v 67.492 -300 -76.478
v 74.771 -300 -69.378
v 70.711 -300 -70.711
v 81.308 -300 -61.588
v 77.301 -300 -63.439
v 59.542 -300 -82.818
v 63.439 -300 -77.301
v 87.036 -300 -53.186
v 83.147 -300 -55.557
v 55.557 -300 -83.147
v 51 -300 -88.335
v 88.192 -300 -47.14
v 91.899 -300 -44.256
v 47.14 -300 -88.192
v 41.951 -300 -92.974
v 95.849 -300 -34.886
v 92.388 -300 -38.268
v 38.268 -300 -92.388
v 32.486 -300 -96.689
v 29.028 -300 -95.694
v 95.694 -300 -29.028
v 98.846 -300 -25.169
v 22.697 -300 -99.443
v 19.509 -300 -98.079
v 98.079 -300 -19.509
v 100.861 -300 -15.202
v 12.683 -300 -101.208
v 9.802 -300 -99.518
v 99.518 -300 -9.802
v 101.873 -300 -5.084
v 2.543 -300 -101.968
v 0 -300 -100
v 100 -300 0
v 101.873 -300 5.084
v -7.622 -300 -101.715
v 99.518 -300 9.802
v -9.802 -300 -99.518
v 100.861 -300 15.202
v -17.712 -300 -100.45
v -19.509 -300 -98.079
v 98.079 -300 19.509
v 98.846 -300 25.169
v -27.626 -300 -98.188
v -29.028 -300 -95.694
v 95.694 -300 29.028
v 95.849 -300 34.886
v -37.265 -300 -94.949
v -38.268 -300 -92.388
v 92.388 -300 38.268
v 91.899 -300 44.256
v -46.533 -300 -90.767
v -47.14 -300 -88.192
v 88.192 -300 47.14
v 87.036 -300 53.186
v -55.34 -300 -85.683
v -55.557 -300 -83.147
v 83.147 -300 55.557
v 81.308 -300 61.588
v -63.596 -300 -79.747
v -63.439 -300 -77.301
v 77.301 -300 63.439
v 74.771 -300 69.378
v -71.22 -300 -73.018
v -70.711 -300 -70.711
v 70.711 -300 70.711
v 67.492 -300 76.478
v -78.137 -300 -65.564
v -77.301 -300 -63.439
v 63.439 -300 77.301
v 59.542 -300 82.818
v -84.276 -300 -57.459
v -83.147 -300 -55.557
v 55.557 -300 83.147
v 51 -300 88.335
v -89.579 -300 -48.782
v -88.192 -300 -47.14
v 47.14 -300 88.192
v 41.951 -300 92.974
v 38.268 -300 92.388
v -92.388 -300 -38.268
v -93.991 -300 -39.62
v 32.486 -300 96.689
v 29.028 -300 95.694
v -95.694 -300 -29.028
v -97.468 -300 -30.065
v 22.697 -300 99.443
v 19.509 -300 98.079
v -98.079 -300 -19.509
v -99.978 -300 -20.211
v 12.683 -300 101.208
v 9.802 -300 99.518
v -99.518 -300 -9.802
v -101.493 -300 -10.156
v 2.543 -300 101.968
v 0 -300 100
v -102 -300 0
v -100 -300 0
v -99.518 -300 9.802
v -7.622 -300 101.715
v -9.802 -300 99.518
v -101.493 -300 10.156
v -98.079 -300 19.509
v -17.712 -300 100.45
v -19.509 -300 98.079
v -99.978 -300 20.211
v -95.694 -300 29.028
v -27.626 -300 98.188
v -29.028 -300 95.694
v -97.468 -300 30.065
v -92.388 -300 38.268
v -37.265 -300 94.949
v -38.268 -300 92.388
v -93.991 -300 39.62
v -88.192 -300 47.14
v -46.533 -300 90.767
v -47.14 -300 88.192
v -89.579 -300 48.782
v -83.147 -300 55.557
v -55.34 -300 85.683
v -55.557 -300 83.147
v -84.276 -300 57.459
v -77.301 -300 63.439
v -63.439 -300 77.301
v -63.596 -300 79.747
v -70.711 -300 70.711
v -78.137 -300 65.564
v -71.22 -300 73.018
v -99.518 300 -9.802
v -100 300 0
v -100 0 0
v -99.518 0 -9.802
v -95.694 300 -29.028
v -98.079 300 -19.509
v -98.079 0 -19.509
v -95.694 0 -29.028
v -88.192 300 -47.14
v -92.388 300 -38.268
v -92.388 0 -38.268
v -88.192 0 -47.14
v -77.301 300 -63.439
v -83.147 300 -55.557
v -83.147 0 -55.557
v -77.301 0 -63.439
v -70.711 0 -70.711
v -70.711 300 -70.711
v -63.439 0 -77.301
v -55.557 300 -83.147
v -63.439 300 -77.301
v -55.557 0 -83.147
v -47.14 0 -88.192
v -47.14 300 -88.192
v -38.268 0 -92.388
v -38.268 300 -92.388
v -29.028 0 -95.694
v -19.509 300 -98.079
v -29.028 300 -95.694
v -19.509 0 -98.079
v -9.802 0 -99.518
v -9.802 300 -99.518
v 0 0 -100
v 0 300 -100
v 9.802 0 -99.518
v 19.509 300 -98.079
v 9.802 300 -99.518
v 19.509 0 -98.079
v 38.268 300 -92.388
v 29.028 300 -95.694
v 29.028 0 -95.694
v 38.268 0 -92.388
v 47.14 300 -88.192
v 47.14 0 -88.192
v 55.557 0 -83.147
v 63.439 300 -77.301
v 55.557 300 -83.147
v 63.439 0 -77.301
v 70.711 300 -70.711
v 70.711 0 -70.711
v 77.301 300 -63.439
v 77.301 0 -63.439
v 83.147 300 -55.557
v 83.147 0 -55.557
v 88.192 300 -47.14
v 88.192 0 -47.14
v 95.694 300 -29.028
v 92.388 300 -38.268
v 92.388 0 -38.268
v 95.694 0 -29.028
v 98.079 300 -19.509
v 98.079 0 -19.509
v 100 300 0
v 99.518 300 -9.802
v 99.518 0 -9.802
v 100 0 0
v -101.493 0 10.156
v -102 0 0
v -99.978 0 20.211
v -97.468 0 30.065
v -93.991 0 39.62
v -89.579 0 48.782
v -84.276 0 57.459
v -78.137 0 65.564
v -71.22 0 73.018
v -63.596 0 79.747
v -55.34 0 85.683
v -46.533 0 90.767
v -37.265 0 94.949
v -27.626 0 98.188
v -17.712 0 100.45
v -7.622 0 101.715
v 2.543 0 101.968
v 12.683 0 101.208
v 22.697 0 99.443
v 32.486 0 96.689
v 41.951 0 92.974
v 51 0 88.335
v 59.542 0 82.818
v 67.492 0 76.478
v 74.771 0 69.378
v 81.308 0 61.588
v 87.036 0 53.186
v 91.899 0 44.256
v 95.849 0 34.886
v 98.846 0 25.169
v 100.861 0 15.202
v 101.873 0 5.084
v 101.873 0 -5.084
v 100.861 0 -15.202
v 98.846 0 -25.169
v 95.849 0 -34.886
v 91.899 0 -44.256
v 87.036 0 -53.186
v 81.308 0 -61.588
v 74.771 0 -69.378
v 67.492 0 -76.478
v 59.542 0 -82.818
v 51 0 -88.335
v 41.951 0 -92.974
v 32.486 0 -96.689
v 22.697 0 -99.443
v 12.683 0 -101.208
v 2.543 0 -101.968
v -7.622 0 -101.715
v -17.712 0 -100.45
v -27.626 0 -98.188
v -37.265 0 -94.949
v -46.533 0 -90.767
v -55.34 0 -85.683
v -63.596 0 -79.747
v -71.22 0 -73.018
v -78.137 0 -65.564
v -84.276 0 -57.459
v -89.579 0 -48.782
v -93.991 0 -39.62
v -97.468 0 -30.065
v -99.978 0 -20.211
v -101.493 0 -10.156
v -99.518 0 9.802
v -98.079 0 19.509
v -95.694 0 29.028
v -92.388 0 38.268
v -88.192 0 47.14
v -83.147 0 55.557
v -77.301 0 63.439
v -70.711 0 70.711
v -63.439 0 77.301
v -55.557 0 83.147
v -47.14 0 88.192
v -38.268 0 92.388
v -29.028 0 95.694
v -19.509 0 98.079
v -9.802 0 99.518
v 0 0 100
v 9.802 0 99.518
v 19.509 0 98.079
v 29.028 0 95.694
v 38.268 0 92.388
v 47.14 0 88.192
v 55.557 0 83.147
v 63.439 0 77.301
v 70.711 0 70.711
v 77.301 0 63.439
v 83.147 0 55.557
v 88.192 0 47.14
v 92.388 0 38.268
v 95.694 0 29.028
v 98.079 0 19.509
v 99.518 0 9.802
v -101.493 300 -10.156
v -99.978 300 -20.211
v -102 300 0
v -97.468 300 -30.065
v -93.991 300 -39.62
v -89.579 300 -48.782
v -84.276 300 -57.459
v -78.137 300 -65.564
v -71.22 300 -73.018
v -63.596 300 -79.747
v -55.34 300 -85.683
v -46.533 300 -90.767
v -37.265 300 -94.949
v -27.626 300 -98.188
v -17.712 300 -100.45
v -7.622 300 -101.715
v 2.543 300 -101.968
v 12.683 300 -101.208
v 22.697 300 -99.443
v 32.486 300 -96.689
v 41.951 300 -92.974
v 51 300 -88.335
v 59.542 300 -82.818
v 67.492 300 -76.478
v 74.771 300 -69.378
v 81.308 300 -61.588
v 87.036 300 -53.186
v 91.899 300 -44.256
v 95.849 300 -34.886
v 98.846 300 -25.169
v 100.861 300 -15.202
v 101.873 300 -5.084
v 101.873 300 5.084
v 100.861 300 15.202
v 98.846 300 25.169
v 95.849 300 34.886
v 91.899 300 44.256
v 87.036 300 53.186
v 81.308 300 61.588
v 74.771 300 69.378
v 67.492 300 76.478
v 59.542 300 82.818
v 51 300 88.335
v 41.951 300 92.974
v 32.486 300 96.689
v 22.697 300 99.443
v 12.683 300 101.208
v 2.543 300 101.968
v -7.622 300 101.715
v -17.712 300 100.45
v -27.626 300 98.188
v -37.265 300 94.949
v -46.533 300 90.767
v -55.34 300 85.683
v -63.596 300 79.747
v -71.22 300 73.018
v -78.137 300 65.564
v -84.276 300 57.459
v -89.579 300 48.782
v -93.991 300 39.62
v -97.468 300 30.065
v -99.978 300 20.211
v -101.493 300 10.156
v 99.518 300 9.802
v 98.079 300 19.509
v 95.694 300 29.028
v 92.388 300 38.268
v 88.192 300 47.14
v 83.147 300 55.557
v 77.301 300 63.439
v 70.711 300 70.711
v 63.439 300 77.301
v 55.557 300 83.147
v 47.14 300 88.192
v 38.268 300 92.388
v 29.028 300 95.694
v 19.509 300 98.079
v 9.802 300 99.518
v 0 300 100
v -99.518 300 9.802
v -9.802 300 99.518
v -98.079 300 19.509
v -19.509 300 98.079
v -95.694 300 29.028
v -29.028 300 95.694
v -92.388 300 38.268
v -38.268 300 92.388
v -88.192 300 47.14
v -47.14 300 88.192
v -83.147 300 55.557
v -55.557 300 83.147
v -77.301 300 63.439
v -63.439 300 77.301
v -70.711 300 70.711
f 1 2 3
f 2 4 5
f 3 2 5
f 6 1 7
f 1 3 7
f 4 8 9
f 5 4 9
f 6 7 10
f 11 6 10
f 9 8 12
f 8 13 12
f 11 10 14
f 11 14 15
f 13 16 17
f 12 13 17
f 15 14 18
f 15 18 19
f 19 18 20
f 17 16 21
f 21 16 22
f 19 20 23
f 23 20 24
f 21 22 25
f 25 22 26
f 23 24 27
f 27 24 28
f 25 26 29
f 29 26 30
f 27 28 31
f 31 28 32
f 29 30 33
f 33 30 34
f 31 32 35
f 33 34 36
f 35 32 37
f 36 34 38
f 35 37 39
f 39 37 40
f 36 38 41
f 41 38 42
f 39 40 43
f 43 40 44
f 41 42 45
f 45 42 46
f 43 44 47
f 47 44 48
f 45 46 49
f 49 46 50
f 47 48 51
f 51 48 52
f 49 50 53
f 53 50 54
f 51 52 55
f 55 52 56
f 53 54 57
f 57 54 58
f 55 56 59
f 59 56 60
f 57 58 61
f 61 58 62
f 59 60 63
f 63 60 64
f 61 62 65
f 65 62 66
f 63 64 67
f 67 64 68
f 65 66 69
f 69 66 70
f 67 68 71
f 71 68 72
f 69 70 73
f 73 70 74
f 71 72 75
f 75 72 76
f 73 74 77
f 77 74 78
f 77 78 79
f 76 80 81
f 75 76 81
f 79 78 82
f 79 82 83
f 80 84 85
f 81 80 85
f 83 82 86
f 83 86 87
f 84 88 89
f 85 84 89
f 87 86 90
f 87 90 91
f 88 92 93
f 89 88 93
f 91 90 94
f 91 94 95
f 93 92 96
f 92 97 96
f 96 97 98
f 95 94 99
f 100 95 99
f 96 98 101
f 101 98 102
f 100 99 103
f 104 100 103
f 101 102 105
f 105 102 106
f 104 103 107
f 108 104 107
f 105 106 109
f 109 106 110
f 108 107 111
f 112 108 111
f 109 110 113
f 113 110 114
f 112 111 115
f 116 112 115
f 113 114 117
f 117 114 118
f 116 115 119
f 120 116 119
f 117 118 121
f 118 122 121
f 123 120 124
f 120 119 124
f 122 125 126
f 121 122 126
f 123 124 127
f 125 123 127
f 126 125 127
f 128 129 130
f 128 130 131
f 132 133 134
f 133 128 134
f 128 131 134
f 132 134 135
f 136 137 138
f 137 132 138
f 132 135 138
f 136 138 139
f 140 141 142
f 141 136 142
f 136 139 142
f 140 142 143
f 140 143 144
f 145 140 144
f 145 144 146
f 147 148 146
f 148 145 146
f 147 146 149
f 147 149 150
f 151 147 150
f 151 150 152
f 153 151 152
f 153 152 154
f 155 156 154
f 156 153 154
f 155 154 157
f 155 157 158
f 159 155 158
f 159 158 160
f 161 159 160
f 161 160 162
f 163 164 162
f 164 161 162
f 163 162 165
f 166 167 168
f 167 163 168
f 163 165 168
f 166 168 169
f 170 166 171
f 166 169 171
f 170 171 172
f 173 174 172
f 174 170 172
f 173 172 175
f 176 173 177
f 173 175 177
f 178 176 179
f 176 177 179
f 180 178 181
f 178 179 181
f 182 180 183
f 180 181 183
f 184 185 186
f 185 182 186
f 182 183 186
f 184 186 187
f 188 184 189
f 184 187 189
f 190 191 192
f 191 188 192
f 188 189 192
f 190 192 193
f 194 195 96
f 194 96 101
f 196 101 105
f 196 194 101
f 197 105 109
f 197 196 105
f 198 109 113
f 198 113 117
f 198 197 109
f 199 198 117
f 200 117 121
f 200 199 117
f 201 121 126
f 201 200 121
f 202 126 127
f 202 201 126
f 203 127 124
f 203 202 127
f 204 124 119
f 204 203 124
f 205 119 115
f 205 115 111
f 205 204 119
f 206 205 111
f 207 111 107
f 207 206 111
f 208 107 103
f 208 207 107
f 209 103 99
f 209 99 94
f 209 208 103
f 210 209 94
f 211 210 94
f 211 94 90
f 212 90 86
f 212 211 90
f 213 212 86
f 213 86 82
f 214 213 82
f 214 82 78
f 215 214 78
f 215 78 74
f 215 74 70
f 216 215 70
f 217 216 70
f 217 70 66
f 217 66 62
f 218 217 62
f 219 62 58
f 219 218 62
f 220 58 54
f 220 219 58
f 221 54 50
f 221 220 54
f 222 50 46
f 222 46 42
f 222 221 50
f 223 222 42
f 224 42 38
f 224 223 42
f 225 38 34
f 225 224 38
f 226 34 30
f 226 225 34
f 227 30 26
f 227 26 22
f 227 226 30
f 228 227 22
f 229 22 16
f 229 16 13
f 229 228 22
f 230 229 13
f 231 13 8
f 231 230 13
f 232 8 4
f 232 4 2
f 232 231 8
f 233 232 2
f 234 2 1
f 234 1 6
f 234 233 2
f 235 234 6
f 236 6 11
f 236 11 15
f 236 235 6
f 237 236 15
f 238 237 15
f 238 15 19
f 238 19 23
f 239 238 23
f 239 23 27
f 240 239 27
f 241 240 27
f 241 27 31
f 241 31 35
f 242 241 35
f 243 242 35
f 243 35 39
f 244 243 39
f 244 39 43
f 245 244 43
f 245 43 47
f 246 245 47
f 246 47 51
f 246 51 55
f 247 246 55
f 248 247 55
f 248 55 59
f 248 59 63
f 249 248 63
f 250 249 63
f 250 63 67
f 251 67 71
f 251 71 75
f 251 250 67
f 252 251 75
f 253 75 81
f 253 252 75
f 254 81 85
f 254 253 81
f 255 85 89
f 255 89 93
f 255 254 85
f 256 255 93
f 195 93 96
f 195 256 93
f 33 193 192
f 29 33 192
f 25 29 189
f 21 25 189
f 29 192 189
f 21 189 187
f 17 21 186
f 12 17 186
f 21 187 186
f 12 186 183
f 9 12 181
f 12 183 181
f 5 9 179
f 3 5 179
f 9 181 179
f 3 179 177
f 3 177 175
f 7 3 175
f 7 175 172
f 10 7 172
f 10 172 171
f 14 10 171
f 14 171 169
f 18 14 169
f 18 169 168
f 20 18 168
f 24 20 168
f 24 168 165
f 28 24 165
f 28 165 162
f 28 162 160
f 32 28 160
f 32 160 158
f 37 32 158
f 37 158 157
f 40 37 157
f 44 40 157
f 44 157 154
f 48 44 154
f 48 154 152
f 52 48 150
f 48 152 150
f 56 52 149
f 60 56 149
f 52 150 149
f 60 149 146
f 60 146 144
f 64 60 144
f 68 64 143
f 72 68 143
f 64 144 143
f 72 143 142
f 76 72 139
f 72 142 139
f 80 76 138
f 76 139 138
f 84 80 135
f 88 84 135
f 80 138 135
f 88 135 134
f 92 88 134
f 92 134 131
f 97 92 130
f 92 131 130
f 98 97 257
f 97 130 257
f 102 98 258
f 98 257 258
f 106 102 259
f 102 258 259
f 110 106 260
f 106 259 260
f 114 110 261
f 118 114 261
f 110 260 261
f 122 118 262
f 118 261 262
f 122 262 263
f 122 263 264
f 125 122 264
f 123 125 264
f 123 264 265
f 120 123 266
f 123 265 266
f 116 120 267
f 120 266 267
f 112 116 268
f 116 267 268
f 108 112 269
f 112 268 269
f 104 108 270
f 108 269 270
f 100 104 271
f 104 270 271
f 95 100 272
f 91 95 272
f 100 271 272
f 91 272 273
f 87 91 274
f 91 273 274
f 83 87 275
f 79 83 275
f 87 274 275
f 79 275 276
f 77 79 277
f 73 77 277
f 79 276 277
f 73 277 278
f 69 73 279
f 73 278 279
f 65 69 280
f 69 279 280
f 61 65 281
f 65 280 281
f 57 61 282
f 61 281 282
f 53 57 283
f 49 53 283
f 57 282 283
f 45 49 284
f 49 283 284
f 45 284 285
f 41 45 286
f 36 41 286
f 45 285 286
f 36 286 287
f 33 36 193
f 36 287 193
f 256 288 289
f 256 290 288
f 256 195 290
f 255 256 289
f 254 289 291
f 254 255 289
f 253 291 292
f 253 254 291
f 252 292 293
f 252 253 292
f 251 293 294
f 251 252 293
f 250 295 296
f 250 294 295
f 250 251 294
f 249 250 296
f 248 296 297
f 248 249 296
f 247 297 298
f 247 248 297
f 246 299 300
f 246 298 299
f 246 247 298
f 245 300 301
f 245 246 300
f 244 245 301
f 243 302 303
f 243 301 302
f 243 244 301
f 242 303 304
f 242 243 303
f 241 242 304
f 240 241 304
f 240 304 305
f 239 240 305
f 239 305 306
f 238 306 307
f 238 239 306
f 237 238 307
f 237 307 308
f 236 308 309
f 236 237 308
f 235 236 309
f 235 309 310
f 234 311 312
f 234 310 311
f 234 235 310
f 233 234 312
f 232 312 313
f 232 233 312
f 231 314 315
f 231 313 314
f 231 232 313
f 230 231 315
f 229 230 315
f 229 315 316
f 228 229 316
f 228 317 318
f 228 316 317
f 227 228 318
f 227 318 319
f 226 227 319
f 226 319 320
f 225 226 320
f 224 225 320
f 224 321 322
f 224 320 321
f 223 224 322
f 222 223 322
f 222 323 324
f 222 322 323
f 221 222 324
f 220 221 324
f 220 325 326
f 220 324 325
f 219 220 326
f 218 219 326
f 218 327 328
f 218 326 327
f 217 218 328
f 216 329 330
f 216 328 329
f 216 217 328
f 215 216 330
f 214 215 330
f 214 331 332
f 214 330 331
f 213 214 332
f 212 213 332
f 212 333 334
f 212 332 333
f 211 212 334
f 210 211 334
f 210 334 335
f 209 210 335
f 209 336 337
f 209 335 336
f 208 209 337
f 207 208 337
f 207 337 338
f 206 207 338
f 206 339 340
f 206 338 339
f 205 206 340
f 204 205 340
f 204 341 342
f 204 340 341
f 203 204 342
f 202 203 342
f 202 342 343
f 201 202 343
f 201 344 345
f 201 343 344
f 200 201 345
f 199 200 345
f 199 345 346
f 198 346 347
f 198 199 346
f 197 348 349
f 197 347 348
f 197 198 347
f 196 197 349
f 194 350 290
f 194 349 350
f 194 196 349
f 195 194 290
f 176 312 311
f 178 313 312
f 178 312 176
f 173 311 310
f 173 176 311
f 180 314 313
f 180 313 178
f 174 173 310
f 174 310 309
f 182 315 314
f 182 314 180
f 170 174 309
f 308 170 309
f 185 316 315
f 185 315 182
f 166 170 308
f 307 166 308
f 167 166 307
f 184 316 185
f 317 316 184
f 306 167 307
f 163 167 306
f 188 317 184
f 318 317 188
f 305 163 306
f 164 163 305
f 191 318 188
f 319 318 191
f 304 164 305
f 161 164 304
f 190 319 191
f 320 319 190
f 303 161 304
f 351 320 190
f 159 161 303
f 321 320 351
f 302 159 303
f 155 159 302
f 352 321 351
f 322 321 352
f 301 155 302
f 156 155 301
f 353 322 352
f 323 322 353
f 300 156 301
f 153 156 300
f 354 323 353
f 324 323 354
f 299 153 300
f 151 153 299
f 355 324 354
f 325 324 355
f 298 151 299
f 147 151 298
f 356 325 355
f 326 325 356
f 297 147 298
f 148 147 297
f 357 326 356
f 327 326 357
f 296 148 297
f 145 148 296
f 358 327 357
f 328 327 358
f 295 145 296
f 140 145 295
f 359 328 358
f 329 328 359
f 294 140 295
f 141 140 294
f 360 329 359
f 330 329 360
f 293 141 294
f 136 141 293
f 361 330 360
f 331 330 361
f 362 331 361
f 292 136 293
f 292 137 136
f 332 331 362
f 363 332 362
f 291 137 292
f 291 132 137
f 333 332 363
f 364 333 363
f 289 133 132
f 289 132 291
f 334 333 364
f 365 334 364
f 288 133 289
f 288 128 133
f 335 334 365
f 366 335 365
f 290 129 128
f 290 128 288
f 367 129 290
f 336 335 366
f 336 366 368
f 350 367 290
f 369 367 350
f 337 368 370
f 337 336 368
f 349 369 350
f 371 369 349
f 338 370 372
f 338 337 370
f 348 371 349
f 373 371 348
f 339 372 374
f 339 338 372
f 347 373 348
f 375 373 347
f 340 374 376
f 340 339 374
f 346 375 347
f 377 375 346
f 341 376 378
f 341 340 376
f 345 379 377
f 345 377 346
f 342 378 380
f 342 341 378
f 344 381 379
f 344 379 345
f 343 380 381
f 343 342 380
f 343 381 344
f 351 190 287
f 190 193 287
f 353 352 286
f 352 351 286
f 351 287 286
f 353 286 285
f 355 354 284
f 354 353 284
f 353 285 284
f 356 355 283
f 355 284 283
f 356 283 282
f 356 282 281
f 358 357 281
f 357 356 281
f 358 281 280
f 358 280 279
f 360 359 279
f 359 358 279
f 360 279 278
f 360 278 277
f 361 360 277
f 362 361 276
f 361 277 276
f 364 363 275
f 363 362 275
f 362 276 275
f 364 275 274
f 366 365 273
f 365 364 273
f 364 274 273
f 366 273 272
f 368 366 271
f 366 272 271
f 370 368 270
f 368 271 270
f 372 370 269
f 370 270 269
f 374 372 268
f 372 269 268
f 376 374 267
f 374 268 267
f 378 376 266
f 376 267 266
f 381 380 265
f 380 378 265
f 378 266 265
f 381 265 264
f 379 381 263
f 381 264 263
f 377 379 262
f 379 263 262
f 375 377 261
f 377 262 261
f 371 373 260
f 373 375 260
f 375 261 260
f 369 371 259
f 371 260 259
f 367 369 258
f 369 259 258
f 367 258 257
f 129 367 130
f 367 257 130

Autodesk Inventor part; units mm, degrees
ref_plane "YZ Plane" through (0, 0, 0) normal (1, 0, 0) x (0, 1, 0)
ref_plane "XZ Plane" through (0, 0, 0) normal (0, 1, 0) x (-1, 0, 0)
ref_plane "XY Plane" through (0, 0, 0) normal (0, 0, 1) x (1, 0, 0)
sketch "Szkic8" plane through (0, 0, 0) normal (0, 1, 0) x (-1, 0, 0)
  circle A0 centre (0, 0) radius 102
  circle A1 centre (0, 0) radius 100
  dimension "d53" = 204
  dimension "d54" = 2
extrude "Wyciągnięcie proste2" add sketch "Szkic8" along normal mid plane 600
sketch "Szkic13" plane through (0, 0, 0) normal (0, 0, 1) x (1, 0, 0)
  circle A0 centre (0, 0) radius 52
  circle A1 centre (0, 0) radius 50
  dimension "d67" = 104
  dimension "d68" = 2
extrude "Wyciągnięcie proste6" add sketch "Szkic13" along normal blind 55.5
sketch "Szkic14" plane through (0, 0, 55.5) normal (0, 0, 1) x (1, 0, 0)
  circle A0 centre (0, 0) radius 50 projected
extrude "Wyciągnięcie proste7" cut sketch "Szkic14" against normal blind 55.5
sketch "Szkic15" plane through (0, -300, 0) normal (0, -1, 0) x (1, 0, 0)
  circle A0 centre (0, 0) radius 100 projected
extrude "Wyciągnięcie proste8" cut sketch "Szkic15" against normal blind 600
fillet "Zaokrąglenie3" [suppressed]
fillet "Zaokrąglenie4" [suppressed]
equation "\"d53\" = OD"
equation "\"d54\" = THK"
equation "\"d55\" = L1"
equation "\"d67\" = OD2"
equation "\"d68\" = THK"
equation "\"d69\" = L2"
equation "\"d71\" = L2"
equation "\"d73\" = L1"
equation "\"d75\" = THK"
equation "\"d76\" = 2 * THK"
equation "\"SzerokośćGięciaPodcięcia\" = Grubość"
equation "\"RozmiarPodcięciaNarożnika\" = 4 * Grubość"
equation "\"PromieńPrzejścia\" = PromieńGięcia"
equation "\"Rozmiar_promienia_Jacobiego\" = PromieńGięcia"
equation "\"Wielk_odstępu\" = Grubość"
equation "\"d2\" = PromieńGięcia"
equation "\"d23\" = PromieńGięcia"
equation "\"OD\" = 204"
equation "\"THK\" = 2"
equation "\"L1\" = 600"
equation "\"L2\" = 55.5"
equation "\"OD2\" = 104"
equation "\"Grubość\" = 1.5"
equation "\"PromieńGięcia\" = 3"
properties part number "Trójnik red. krótki  Ø204 104 204 s=2 L=600" material "304"
